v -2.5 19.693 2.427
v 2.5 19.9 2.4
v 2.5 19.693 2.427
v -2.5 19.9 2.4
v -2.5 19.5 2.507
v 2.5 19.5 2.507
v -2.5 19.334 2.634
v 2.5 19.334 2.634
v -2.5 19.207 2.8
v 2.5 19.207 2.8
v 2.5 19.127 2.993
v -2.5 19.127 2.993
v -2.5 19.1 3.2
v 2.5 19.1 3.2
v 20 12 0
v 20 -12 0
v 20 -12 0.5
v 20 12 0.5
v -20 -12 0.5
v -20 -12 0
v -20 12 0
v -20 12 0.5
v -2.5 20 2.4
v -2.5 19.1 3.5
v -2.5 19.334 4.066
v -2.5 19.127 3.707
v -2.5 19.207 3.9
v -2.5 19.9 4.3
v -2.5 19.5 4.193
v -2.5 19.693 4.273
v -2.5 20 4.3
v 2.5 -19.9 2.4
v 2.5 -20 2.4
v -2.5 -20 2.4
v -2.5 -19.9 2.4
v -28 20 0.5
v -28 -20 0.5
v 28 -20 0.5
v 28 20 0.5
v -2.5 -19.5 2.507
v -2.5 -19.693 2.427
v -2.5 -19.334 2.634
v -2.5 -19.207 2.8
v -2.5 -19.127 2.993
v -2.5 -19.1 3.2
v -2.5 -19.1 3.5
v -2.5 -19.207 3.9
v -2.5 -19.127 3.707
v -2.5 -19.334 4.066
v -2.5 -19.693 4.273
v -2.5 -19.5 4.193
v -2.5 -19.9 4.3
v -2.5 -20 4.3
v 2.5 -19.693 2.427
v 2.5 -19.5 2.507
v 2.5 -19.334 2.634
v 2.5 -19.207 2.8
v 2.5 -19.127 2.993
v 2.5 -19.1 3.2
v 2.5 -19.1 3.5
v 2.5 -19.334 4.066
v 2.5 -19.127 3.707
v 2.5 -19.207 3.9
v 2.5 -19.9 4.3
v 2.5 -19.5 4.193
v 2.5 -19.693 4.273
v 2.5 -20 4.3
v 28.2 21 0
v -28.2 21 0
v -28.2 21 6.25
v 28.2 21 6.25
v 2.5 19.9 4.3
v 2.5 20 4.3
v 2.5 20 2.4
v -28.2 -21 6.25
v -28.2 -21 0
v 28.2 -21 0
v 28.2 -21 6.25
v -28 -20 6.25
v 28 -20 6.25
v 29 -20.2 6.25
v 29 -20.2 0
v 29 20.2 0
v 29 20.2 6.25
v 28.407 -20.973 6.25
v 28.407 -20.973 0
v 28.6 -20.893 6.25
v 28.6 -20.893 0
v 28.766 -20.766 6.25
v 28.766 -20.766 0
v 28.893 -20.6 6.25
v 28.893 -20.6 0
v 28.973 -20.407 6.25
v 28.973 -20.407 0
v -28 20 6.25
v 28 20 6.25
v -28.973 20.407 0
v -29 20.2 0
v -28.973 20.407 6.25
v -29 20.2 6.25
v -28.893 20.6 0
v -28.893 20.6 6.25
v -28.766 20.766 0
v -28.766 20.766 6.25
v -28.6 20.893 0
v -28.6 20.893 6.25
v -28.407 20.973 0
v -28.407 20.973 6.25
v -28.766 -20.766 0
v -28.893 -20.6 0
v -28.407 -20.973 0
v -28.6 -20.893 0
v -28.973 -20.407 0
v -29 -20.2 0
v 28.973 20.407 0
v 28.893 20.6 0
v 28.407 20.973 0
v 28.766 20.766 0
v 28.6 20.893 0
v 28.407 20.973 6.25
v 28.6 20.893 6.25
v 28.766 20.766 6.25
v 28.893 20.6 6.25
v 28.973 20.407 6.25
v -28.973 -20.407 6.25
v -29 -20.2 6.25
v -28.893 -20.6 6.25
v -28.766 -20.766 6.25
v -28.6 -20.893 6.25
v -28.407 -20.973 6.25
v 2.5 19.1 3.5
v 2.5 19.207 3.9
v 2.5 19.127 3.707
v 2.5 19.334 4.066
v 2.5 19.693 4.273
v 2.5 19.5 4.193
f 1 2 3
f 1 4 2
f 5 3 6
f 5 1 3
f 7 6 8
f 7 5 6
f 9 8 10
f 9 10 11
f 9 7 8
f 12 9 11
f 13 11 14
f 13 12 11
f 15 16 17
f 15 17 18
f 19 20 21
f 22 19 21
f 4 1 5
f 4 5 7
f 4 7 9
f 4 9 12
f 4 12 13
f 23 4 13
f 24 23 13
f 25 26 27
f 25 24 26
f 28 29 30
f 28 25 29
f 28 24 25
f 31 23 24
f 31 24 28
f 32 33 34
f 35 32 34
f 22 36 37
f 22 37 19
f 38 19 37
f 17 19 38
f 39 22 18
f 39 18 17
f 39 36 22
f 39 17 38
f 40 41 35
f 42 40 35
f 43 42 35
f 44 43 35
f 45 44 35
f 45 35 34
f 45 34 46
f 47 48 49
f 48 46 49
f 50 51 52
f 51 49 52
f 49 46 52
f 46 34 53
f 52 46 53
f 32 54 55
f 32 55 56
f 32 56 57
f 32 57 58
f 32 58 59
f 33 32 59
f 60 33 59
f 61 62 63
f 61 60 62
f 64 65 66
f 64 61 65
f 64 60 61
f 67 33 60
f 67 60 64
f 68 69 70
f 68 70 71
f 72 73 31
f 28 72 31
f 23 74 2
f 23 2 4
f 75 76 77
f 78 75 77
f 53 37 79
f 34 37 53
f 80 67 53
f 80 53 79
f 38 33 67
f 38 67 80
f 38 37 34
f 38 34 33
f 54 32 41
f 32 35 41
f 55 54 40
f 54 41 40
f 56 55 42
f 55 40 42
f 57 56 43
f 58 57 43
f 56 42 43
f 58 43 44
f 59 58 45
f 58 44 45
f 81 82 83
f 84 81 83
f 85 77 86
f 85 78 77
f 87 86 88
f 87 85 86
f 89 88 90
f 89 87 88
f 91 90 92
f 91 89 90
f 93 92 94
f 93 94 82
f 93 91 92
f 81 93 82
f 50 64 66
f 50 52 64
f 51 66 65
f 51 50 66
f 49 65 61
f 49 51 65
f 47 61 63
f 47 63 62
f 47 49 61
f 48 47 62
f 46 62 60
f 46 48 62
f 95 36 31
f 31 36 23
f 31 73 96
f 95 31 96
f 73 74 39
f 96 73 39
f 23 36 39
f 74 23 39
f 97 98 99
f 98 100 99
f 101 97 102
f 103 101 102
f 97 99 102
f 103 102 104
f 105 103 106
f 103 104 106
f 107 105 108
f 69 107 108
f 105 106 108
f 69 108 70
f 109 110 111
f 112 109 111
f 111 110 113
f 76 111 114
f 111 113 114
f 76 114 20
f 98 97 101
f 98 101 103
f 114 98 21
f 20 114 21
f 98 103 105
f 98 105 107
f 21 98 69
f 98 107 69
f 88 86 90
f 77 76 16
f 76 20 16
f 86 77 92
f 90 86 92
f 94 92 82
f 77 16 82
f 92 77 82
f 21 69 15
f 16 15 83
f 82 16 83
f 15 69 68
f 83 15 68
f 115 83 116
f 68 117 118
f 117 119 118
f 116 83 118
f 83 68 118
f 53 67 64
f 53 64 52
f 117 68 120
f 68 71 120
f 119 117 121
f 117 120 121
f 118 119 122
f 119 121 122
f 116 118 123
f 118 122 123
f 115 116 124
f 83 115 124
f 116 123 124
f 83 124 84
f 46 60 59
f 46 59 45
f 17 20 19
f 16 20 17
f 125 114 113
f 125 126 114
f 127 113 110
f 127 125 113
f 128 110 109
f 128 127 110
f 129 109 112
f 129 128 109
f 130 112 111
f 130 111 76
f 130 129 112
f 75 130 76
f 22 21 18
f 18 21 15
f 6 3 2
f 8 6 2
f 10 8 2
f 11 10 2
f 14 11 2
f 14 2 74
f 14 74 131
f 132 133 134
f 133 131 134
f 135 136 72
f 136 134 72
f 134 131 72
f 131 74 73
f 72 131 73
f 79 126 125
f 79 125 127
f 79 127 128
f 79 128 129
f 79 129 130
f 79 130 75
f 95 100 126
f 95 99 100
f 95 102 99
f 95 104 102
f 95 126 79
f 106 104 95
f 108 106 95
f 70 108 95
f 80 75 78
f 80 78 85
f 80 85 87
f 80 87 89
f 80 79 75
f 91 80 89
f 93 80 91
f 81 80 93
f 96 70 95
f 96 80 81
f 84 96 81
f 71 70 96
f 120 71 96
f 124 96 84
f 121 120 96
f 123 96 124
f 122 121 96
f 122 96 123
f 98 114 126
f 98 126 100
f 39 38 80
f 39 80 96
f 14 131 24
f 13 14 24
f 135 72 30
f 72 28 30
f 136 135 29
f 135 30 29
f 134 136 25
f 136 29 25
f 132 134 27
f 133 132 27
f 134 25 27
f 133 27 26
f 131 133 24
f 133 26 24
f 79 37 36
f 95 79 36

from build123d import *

# Parameters (mm, degrees)
F0_W     = 56
F0_H     = 40
F0_W_2   = 40
F0_H_2   = 24
F1_DEPTH = 0.5
F0_W_3   = 58
F0_H_3   = 42
F2_DEPTH = 6.25
F3_W     = 5
F3_H     = 1.9
F4_DEPTH = 0.9
F5_R     = 0.8


# Not quite as in the source:
# - two fillets or chamfers of one size are made in one step
# - a pattern or mirror of a feature is missing from the dataset's text; its kind, count and spacing are read off the source's solid


with BuildPart() as f1:
    # F0 (on Top) → F1 (new body)
    with BuildSketch(Plane.XY):
        Rectangle(F0_W, F0_H)
        Rectangle(F0_W_2, F0_H_2, mode=Mode.SUBTRACT)
    extrude(amount=F1_DEPTH)

    # F0 (on Top) → F2 (join)
    with BuildSketch(Plane.XY):
        Rectangle(F0_W_3, F0_H_3)
        Rectangle(F0_W, F0_H, mode=Mode.SUBTRACT)
    extrude(amount=F2_DEPTH)

    # F3 (on face) → F4 (join)
    with BuildSketch(Plane(origin=(0, -20, 0), x_dir=(-1, 0, 0), z_dir=(0, 1, 0))):
        with Locations((0, 3.35)):
            Rectangle(F3_W, F3_H)
    f4 = extrude(amount=F4_DEPTH)

    # F4_copies: F4 across plane
    add(f4.mirror(Plane.ZX))

    # F5
    f5_edges = [f1.edges().sort_by_distance(p)[0] for p in [
        (0, -19.1, 4.3),
        (0, -19.1, 2.4),
        (29, 21, 3.125),
        (-29, 21, 3.125),
        (-29, -21, 3.125),
        (29, -21, 3.125),
        (0, 19.1, 4.3),
        (0, 19.1, 2.4),
    ]]
    fillet(f5_edges, radius=F5_R)


solid = f1.part
